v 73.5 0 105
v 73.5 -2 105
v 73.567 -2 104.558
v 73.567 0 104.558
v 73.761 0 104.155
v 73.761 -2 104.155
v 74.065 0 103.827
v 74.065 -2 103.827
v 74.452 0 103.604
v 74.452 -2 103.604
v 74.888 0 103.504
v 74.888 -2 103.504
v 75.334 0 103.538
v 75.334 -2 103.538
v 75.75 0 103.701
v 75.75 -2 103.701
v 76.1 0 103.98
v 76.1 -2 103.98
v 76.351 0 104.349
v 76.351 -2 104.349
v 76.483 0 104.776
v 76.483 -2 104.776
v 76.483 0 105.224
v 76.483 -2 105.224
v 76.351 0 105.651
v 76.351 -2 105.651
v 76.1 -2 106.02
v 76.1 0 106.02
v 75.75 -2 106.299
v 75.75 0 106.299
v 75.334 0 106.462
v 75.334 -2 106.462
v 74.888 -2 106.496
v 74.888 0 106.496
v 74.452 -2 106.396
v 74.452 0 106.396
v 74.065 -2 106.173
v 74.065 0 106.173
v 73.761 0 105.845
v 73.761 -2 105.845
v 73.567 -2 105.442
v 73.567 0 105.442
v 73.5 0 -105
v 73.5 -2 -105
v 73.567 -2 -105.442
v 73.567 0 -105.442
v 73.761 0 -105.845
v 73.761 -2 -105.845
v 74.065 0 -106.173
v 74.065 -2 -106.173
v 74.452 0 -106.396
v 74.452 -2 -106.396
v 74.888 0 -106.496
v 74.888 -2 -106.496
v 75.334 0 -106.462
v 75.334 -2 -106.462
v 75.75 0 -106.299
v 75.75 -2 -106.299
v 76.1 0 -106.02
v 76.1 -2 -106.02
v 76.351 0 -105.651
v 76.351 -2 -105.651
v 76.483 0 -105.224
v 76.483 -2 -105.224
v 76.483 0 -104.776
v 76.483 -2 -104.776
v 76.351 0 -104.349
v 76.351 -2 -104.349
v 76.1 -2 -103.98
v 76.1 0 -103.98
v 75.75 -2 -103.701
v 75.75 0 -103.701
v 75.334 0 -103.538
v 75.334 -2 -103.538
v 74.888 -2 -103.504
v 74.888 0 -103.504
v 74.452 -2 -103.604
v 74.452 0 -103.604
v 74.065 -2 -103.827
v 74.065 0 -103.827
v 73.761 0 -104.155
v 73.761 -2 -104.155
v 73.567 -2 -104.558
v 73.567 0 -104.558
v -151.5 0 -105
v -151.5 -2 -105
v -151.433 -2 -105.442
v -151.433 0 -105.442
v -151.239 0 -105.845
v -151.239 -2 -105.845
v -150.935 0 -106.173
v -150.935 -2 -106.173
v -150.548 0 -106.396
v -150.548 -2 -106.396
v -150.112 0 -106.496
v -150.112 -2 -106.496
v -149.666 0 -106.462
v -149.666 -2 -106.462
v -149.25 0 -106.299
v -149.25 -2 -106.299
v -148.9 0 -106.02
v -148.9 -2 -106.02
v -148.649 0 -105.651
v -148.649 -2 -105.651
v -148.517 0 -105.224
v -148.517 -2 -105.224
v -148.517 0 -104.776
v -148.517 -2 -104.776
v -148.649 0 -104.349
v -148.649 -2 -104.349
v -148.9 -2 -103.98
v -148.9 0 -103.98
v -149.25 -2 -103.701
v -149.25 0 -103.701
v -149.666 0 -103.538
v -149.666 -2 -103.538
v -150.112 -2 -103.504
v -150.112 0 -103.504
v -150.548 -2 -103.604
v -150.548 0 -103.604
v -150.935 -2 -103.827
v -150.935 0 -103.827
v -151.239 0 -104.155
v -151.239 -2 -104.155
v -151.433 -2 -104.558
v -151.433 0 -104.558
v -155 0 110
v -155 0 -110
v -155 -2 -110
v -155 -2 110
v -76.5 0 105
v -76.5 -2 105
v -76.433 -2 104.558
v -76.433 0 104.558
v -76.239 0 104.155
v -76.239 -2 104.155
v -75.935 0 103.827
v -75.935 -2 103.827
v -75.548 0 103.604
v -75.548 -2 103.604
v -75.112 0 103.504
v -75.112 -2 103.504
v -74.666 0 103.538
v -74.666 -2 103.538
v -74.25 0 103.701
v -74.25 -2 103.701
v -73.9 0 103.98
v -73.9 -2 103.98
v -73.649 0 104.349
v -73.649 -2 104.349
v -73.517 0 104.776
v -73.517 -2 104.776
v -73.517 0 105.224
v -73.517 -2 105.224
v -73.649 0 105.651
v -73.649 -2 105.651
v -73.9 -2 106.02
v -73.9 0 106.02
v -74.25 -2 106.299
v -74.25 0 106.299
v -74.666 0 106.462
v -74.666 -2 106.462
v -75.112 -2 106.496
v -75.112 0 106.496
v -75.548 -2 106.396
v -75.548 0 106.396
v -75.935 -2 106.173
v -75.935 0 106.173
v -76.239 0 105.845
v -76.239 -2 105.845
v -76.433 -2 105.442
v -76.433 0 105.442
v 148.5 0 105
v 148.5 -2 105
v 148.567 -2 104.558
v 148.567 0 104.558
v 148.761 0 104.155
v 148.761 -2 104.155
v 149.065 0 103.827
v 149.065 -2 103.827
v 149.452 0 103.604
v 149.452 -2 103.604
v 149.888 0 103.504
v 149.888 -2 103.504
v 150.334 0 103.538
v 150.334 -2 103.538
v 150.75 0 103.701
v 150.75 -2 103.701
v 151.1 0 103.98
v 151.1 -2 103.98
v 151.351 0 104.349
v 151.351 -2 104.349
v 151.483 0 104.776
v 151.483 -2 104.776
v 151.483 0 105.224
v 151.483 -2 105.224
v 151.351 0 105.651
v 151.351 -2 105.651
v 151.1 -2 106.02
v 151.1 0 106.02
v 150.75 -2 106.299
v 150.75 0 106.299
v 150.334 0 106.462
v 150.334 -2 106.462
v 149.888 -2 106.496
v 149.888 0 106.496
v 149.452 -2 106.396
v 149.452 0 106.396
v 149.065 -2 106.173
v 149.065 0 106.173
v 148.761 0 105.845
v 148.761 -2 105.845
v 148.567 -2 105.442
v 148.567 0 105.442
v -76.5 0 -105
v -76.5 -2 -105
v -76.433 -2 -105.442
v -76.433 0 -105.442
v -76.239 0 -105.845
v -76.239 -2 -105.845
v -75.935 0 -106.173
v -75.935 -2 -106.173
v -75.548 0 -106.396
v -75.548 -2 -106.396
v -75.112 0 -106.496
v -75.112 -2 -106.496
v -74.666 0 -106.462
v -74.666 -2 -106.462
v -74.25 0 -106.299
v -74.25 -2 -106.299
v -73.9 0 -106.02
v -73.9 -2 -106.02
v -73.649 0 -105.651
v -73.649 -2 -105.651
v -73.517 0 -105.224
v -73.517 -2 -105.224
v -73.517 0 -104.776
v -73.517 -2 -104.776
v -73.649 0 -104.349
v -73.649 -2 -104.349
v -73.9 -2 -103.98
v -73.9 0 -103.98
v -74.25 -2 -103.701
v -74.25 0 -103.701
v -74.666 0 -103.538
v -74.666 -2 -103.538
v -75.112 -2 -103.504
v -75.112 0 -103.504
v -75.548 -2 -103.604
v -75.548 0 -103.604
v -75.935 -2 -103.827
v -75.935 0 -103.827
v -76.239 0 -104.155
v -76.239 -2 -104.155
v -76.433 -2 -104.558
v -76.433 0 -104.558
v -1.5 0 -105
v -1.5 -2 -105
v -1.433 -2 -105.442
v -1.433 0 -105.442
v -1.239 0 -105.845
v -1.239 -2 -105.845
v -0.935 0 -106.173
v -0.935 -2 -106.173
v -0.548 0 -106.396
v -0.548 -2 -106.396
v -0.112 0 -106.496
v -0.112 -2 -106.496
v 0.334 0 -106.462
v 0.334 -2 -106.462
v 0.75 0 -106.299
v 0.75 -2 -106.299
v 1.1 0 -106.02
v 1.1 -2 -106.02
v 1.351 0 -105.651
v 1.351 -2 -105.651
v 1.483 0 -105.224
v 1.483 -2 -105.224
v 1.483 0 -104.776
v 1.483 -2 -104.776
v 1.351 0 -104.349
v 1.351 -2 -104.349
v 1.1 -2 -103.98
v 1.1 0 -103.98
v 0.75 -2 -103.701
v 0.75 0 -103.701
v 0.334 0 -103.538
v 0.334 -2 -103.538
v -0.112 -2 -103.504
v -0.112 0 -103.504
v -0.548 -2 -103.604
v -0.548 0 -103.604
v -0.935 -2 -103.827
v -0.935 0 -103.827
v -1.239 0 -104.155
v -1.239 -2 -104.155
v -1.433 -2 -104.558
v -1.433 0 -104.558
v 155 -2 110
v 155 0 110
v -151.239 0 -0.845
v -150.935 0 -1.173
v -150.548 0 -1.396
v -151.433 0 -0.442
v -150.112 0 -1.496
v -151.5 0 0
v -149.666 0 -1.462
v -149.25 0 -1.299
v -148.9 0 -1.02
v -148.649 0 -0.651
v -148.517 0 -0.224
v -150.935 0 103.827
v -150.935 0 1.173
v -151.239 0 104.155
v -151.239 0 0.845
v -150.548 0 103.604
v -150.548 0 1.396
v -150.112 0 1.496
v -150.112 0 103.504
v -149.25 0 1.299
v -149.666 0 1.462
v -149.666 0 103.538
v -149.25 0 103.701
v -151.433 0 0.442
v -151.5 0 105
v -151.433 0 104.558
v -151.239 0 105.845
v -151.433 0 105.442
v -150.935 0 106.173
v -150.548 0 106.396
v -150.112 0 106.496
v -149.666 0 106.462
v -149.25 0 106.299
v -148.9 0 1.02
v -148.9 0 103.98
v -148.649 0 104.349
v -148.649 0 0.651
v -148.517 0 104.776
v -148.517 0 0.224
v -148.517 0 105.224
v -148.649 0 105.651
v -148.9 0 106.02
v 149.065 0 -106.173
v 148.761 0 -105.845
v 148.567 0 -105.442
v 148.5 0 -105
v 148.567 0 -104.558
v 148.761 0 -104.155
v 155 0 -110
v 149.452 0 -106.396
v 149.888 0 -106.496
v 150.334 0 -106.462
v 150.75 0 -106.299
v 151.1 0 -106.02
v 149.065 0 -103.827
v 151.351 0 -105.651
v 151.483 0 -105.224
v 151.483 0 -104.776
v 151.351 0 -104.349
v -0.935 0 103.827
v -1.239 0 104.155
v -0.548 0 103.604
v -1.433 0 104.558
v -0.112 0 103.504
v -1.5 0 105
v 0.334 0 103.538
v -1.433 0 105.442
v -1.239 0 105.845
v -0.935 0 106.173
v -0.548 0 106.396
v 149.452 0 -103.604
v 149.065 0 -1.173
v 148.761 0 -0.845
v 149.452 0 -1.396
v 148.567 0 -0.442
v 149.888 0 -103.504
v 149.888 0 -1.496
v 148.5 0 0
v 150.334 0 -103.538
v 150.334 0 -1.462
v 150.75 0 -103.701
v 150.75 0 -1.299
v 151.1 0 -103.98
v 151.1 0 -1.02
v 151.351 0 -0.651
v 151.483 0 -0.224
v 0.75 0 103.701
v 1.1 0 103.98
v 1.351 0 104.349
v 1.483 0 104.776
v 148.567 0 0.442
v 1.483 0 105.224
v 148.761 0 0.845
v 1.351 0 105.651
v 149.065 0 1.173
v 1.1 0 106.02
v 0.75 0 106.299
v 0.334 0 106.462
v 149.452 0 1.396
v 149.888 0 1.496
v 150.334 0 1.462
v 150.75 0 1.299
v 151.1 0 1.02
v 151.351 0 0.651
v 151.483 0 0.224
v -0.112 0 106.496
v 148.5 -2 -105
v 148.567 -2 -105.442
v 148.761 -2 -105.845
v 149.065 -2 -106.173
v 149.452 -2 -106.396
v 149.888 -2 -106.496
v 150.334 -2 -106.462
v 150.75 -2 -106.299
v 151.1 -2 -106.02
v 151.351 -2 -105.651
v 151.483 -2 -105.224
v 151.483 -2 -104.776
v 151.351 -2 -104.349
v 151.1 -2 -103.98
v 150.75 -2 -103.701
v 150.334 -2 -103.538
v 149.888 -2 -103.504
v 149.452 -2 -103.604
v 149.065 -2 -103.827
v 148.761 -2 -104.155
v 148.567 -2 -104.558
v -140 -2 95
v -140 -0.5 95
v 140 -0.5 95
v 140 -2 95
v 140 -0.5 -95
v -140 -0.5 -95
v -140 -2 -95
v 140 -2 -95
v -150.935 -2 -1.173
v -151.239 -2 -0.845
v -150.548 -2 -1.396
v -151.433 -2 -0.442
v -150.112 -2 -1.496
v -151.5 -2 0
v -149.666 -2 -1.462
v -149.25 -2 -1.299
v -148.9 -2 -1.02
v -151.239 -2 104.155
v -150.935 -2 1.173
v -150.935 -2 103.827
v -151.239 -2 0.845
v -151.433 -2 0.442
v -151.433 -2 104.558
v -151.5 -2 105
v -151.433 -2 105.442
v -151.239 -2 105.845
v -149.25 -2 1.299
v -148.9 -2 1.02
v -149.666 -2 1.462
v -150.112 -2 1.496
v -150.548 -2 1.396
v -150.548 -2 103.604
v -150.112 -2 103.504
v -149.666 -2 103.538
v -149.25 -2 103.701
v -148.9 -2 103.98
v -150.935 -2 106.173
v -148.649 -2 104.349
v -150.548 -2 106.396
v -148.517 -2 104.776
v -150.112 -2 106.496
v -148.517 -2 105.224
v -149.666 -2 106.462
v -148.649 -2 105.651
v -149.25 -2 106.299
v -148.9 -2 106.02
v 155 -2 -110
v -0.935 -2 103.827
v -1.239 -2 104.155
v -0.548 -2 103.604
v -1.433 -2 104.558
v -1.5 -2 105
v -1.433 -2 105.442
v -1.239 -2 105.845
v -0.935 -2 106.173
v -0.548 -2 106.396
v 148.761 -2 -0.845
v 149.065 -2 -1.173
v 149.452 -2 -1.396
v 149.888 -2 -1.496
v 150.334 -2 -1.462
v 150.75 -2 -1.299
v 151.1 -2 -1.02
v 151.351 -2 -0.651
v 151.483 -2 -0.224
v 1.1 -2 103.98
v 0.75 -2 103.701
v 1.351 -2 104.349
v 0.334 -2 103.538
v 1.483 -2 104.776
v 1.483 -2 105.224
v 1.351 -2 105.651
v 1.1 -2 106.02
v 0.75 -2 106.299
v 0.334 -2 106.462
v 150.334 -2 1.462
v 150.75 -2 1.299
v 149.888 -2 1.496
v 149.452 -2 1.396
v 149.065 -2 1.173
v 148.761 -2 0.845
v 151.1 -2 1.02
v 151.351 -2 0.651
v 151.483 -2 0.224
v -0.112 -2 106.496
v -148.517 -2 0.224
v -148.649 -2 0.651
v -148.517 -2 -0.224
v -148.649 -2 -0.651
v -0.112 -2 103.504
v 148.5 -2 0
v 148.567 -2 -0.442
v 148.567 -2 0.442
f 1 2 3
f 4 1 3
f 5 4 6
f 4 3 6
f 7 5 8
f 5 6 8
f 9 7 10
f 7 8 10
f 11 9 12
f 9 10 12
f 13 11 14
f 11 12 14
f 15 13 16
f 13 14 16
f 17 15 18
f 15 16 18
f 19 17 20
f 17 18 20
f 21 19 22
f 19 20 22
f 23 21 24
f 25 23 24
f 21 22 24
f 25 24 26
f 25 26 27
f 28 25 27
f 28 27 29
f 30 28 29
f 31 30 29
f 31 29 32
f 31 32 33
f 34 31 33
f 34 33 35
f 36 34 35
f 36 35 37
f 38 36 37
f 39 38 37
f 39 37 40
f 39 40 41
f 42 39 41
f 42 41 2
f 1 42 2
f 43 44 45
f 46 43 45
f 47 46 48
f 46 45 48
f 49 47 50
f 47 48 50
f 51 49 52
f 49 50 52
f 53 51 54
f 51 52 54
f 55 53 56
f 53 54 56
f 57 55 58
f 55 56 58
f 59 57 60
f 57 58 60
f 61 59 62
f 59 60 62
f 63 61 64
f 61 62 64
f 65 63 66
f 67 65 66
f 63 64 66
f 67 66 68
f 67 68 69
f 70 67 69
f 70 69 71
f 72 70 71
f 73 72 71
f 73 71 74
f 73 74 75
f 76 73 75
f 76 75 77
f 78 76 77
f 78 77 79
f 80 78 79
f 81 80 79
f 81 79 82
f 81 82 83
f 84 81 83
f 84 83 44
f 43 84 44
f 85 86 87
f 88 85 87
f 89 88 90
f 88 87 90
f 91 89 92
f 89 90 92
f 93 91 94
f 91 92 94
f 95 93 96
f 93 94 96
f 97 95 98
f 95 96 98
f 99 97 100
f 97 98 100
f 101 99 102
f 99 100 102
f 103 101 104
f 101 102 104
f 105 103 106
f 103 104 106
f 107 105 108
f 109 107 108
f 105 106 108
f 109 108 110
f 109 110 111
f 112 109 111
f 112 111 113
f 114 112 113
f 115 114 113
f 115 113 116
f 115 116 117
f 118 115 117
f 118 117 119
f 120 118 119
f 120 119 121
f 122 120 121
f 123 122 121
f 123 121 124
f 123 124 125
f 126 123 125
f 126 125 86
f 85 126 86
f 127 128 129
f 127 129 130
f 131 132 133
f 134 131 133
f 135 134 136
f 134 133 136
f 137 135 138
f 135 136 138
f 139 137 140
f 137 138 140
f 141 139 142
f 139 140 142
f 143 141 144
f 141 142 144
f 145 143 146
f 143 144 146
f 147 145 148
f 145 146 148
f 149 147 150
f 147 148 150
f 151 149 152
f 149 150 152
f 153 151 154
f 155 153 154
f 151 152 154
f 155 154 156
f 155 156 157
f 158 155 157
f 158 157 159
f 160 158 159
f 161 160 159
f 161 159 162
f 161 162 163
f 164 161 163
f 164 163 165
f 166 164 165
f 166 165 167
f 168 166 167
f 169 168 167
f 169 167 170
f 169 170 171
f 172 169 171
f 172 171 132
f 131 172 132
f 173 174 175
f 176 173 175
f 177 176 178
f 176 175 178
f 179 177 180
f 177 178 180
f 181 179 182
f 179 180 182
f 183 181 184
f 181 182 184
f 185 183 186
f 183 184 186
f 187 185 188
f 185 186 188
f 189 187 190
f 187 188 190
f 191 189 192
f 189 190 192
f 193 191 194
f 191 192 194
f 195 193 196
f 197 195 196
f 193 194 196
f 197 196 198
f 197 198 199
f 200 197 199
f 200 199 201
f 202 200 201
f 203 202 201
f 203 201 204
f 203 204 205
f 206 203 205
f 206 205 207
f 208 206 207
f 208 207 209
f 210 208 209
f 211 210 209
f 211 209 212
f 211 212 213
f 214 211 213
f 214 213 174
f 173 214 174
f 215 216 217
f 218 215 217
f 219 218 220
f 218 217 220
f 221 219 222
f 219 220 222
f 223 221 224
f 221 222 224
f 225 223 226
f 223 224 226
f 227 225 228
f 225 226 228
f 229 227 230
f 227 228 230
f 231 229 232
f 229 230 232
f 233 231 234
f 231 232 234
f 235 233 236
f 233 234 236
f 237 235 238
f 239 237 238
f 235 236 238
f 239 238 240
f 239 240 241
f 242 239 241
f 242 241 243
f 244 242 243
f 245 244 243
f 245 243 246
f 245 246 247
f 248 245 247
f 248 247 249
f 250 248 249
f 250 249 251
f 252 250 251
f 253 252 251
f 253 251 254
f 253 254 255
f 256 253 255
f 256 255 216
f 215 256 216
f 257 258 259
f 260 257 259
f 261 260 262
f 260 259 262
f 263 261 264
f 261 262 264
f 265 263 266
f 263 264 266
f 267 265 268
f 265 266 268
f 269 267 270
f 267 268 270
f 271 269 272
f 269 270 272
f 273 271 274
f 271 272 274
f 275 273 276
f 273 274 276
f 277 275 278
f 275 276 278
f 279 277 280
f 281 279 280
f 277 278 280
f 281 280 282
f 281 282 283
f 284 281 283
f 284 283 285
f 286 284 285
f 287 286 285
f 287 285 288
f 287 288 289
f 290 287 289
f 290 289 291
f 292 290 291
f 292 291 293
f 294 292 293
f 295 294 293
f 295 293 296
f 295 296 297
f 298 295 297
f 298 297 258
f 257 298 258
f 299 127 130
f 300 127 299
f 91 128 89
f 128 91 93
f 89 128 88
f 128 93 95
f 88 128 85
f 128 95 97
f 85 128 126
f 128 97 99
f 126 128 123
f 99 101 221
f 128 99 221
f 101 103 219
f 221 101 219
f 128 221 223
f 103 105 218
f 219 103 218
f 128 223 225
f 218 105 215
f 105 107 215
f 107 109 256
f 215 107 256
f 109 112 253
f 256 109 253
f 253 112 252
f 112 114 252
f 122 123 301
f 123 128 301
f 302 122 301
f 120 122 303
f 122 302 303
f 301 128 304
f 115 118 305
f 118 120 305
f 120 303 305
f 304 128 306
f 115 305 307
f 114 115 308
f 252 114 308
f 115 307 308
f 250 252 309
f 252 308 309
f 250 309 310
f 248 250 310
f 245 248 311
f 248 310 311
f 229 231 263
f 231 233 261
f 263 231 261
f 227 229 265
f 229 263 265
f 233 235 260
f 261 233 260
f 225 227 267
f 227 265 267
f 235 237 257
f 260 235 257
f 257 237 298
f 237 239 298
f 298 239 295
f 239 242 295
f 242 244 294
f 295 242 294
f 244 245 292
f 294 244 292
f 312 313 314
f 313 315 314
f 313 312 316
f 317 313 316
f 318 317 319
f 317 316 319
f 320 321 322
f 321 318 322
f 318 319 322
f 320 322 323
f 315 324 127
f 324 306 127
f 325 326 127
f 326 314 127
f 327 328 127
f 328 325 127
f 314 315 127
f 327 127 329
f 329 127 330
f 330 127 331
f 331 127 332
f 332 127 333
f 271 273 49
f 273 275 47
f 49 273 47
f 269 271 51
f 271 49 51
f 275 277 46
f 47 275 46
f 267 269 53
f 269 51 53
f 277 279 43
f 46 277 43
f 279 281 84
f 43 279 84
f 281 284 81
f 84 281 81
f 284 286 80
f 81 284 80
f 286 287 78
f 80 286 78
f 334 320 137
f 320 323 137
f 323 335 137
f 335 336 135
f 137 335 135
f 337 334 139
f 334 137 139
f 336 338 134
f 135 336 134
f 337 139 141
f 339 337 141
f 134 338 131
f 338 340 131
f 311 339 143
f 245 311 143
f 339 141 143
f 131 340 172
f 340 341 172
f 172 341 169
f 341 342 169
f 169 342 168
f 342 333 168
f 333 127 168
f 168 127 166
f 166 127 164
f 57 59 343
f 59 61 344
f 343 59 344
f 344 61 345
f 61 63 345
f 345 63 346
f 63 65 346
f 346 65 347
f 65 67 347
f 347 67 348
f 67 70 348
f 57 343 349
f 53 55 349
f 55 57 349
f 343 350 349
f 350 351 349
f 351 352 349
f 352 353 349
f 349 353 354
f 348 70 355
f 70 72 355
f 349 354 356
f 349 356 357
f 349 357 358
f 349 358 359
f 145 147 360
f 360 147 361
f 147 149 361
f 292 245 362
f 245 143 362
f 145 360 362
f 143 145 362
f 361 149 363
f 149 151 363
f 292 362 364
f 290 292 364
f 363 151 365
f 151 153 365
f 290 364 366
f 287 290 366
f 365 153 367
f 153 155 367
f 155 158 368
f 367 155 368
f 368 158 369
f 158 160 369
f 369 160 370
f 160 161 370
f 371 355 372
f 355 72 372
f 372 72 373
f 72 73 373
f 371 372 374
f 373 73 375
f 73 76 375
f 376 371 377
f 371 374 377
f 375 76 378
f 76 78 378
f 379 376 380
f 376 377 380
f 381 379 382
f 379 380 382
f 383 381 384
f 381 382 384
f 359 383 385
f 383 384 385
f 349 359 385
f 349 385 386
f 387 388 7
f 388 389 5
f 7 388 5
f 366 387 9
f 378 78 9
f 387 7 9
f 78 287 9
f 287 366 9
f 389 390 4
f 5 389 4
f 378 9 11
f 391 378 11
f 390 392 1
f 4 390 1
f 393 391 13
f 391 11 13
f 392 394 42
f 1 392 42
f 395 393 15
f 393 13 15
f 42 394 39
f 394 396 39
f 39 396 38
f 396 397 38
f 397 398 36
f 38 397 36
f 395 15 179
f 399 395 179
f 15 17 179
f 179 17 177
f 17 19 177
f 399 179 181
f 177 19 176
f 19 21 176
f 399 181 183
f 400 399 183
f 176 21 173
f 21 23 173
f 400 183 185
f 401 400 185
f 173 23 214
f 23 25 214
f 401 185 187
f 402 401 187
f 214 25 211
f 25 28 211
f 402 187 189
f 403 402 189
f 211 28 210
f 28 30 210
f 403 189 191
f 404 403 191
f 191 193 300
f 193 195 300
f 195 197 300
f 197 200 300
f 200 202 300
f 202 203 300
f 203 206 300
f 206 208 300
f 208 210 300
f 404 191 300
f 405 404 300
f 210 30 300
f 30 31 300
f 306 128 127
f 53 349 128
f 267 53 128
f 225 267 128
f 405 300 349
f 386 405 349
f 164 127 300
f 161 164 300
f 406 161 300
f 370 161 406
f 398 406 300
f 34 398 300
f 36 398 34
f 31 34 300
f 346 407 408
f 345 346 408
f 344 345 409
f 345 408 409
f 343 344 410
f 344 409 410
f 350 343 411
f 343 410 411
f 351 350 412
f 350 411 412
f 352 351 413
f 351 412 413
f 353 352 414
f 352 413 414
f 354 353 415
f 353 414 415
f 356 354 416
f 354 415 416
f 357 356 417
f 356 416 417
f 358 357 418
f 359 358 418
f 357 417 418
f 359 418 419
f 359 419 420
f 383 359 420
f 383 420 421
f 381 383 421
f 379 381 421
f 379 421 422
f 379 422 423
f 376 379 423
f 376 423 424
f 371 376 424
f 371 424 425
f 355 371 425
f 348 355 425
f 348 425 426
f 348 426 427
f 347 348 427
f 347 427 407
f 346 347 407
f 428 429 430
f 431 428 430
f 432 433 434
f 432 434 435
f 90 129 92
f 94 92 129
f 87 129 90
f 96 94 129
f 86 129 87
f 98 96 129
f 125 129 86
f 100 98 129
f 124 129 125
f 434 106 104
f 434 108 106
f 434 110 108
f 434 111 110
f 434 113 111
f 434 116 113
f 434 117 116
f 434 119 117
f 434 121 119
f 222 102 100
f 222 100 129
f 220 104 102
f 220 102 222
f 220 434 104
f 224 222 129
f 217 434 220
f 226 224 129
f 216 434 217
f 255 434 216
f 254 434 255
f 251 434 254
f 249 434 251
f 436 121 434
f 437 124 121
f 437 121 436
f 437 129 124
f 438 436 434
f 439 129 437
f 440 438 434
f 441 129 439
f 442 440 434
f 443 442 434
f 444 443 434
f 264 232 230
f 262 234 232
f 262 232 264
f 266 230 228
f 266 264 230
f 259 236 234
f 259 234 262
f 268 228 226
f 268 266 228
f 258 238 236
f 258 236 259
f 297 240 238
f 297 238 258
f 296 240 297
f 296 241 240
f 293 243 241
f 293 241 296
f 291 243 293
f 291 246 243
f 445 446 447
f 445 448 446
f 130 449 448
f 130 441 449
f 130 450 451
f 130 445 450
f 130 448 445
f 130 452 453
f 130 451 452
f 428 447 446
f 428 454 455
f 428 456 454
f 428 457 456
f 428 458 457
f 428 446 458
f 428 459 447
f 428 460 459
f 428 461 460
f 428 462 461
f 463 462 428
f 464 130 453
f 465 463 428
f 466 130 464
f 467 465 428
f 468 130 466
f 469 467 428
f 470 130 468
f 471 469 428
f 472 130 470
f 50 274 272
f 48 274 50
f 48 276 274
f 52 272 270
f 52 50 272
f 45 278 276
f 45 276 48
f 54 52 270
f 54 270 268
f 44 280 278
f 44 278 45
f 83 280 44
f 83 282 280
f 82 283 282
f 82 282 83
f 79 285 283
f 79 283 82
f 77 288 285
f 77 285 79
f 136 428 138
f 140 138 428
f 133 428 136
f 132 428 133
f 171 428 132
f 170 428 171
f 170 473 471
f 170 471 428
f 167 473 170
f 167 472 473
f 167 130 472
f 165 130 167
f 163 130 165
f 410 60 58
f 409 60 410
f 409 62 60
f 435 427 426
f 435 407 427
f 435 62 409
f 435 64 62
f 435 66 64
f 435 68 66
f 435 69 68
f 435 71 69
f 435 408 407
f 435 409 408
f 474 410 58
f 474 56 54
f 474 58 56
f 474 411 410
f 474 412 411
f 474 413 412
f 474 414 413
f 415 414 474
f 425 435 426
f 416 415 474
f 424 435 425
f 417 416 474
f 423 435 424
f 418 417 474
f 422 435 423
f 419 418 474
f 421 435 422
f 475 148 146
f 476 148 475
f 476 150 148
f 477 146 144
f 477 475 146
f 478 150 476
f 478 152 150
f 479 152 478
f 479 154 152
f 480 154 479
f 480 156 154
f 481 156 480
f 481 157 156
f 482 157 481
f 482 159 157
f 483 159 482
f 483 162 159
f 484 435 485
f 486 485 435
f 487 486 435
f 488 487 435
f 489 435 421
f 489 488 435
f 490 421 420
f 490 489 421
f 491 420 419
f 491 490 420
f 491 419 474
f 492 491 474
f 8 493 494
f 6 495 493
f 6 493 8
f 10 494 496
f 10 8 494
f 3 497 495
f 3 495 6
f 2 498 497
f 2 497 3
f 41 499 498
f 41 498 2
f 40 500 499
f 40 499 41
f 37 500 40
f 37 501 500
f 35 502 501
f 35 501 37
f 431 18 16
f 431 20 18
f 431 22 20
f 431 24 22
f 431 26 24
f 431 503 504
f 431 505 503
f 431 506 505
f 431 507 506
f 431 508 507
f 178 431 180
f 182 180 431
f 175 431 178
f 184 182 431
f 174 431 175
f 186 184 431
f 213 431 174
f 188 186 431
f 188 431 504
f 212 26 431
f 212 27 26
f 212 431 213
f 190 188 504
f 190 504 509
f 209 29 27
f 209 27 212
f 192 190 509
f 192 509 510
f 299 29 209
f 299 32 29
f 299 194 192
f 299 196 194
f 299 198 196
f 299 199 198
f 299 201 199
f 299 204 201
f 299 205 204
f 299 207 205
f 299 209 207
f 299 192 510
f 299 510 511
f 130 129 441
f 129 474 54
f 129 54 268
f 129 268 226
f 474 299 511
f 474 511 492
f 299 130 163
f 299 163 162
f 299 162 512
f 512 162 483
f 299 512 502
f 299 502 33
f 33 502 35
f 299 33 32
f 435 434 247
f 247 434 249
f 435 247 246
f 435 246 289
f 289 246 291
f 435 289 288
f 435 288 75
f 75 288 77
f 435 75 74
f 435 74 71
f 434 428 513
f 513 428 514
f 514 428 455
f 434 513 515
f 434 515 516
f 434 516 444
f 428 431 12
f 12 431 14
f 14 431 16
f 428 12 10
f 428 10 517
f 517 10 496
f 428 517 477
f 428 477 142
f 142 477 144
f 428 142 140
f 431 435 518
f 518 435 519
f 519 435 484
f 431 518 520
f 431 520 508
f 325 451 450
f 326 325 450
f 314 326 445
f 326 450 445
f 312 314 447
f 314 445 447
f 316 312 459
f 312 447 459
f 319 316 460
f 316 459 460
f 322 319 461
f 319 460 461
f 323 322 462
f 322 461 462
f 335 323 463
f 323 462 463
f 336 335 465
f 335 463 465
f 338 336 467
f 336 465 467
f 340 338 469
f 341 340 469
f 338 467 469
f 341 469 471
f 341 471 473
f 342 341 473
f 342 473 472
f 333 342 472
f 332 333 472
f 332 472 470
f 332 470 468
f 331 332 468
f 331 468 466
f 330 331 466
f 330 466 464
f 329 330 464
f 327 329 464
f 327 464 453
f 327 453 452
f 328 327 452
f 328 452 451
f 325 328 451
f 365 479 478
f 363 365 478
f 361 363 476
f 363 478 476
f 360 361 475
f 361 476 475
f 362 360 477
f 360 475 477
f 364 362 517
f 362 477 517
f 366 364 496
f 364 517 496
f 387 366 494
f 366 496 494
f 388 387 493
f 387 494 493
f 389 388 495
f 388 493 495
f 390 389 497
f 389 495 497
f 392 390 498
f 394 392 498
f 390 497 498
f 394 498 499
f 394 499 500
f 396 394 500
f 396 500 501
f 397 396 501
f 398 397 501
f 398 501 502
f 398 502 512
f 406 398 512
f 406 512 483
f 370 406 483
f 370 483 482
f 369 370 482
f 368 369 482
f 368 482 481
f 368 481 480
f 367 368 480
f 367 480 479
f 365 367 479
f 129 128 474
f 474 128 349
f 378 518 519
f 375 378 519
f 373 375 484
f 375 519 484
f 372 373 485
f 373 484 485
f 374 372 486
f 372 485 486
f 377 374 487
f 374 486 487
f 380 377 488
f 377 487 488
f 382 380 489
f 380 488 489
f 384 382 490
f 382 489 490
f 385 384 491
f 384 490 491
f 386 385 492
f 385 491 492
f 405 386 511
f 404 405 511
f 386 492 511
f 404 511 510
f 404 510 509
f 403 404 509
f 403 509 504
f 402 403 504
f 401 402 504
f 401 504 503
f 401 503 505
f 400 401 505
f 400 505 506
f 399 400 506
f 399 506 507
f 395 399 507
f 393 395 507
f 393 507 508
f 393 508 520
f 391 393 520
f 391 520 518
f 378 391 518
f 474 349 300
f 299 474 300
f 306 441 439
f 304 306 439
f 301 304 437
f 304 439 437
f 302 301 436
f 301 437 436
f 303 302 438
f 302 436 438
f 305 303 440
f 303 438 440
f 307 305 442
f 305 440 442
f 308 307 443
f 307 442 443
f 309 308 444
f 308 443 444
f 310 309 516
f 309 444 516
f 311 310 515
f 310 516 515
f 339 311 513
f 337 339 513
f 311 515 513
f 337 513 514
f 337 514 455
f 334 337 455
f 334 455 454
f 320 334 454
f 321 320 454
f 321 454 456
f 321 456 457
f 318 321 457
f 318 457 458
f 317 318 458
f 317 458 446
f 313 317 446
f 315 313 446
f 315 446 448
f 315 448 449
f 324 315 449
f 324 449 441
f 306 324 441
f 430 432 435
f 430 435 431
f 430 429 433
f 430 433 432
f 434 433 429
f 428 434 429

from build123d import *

# Parameters (mm, degrees)
F0_W     = 310
F0_H     = 220
F0_W_2   = 280
F0_H_2   = 190
F1_DEPTH = 2
F2_D     = 3
F3_DEPTH = 0.5


with BuildPart() as f1:
    # F0 (on Front) → F1 (new body)
    with BuildSketch(Plane.XZ):
        Rectangle(F0_W, F0_H)
        Rectangle(F0_W_2, F0_H_2, mode=Mode.SUBTRACT)
    extrude(amount=F1_DEPTH)

    # F2 (through all)
    with Locations(Plane(origin=(0, 0, 0), x_dir=(1, 0, 0), z_dir=(0, 1, 0))):
        with Locations((-150, 105), (-75, 105), (0, 105), (75, 105), (150, 105), (150, 0), (150, -105), (75, -105), (0, -105), (-75, -105), (-150, -105), (-150, 0)):
            Hole(F2_D / 2)

    # F0 (on Front) → F3 (join)
    with BuildSketch(Plane.XZ):
        Rectangle(F0_W_2, F0_H_2)
    extrude(amount=F3_DEPTH)


solid = f1.part
